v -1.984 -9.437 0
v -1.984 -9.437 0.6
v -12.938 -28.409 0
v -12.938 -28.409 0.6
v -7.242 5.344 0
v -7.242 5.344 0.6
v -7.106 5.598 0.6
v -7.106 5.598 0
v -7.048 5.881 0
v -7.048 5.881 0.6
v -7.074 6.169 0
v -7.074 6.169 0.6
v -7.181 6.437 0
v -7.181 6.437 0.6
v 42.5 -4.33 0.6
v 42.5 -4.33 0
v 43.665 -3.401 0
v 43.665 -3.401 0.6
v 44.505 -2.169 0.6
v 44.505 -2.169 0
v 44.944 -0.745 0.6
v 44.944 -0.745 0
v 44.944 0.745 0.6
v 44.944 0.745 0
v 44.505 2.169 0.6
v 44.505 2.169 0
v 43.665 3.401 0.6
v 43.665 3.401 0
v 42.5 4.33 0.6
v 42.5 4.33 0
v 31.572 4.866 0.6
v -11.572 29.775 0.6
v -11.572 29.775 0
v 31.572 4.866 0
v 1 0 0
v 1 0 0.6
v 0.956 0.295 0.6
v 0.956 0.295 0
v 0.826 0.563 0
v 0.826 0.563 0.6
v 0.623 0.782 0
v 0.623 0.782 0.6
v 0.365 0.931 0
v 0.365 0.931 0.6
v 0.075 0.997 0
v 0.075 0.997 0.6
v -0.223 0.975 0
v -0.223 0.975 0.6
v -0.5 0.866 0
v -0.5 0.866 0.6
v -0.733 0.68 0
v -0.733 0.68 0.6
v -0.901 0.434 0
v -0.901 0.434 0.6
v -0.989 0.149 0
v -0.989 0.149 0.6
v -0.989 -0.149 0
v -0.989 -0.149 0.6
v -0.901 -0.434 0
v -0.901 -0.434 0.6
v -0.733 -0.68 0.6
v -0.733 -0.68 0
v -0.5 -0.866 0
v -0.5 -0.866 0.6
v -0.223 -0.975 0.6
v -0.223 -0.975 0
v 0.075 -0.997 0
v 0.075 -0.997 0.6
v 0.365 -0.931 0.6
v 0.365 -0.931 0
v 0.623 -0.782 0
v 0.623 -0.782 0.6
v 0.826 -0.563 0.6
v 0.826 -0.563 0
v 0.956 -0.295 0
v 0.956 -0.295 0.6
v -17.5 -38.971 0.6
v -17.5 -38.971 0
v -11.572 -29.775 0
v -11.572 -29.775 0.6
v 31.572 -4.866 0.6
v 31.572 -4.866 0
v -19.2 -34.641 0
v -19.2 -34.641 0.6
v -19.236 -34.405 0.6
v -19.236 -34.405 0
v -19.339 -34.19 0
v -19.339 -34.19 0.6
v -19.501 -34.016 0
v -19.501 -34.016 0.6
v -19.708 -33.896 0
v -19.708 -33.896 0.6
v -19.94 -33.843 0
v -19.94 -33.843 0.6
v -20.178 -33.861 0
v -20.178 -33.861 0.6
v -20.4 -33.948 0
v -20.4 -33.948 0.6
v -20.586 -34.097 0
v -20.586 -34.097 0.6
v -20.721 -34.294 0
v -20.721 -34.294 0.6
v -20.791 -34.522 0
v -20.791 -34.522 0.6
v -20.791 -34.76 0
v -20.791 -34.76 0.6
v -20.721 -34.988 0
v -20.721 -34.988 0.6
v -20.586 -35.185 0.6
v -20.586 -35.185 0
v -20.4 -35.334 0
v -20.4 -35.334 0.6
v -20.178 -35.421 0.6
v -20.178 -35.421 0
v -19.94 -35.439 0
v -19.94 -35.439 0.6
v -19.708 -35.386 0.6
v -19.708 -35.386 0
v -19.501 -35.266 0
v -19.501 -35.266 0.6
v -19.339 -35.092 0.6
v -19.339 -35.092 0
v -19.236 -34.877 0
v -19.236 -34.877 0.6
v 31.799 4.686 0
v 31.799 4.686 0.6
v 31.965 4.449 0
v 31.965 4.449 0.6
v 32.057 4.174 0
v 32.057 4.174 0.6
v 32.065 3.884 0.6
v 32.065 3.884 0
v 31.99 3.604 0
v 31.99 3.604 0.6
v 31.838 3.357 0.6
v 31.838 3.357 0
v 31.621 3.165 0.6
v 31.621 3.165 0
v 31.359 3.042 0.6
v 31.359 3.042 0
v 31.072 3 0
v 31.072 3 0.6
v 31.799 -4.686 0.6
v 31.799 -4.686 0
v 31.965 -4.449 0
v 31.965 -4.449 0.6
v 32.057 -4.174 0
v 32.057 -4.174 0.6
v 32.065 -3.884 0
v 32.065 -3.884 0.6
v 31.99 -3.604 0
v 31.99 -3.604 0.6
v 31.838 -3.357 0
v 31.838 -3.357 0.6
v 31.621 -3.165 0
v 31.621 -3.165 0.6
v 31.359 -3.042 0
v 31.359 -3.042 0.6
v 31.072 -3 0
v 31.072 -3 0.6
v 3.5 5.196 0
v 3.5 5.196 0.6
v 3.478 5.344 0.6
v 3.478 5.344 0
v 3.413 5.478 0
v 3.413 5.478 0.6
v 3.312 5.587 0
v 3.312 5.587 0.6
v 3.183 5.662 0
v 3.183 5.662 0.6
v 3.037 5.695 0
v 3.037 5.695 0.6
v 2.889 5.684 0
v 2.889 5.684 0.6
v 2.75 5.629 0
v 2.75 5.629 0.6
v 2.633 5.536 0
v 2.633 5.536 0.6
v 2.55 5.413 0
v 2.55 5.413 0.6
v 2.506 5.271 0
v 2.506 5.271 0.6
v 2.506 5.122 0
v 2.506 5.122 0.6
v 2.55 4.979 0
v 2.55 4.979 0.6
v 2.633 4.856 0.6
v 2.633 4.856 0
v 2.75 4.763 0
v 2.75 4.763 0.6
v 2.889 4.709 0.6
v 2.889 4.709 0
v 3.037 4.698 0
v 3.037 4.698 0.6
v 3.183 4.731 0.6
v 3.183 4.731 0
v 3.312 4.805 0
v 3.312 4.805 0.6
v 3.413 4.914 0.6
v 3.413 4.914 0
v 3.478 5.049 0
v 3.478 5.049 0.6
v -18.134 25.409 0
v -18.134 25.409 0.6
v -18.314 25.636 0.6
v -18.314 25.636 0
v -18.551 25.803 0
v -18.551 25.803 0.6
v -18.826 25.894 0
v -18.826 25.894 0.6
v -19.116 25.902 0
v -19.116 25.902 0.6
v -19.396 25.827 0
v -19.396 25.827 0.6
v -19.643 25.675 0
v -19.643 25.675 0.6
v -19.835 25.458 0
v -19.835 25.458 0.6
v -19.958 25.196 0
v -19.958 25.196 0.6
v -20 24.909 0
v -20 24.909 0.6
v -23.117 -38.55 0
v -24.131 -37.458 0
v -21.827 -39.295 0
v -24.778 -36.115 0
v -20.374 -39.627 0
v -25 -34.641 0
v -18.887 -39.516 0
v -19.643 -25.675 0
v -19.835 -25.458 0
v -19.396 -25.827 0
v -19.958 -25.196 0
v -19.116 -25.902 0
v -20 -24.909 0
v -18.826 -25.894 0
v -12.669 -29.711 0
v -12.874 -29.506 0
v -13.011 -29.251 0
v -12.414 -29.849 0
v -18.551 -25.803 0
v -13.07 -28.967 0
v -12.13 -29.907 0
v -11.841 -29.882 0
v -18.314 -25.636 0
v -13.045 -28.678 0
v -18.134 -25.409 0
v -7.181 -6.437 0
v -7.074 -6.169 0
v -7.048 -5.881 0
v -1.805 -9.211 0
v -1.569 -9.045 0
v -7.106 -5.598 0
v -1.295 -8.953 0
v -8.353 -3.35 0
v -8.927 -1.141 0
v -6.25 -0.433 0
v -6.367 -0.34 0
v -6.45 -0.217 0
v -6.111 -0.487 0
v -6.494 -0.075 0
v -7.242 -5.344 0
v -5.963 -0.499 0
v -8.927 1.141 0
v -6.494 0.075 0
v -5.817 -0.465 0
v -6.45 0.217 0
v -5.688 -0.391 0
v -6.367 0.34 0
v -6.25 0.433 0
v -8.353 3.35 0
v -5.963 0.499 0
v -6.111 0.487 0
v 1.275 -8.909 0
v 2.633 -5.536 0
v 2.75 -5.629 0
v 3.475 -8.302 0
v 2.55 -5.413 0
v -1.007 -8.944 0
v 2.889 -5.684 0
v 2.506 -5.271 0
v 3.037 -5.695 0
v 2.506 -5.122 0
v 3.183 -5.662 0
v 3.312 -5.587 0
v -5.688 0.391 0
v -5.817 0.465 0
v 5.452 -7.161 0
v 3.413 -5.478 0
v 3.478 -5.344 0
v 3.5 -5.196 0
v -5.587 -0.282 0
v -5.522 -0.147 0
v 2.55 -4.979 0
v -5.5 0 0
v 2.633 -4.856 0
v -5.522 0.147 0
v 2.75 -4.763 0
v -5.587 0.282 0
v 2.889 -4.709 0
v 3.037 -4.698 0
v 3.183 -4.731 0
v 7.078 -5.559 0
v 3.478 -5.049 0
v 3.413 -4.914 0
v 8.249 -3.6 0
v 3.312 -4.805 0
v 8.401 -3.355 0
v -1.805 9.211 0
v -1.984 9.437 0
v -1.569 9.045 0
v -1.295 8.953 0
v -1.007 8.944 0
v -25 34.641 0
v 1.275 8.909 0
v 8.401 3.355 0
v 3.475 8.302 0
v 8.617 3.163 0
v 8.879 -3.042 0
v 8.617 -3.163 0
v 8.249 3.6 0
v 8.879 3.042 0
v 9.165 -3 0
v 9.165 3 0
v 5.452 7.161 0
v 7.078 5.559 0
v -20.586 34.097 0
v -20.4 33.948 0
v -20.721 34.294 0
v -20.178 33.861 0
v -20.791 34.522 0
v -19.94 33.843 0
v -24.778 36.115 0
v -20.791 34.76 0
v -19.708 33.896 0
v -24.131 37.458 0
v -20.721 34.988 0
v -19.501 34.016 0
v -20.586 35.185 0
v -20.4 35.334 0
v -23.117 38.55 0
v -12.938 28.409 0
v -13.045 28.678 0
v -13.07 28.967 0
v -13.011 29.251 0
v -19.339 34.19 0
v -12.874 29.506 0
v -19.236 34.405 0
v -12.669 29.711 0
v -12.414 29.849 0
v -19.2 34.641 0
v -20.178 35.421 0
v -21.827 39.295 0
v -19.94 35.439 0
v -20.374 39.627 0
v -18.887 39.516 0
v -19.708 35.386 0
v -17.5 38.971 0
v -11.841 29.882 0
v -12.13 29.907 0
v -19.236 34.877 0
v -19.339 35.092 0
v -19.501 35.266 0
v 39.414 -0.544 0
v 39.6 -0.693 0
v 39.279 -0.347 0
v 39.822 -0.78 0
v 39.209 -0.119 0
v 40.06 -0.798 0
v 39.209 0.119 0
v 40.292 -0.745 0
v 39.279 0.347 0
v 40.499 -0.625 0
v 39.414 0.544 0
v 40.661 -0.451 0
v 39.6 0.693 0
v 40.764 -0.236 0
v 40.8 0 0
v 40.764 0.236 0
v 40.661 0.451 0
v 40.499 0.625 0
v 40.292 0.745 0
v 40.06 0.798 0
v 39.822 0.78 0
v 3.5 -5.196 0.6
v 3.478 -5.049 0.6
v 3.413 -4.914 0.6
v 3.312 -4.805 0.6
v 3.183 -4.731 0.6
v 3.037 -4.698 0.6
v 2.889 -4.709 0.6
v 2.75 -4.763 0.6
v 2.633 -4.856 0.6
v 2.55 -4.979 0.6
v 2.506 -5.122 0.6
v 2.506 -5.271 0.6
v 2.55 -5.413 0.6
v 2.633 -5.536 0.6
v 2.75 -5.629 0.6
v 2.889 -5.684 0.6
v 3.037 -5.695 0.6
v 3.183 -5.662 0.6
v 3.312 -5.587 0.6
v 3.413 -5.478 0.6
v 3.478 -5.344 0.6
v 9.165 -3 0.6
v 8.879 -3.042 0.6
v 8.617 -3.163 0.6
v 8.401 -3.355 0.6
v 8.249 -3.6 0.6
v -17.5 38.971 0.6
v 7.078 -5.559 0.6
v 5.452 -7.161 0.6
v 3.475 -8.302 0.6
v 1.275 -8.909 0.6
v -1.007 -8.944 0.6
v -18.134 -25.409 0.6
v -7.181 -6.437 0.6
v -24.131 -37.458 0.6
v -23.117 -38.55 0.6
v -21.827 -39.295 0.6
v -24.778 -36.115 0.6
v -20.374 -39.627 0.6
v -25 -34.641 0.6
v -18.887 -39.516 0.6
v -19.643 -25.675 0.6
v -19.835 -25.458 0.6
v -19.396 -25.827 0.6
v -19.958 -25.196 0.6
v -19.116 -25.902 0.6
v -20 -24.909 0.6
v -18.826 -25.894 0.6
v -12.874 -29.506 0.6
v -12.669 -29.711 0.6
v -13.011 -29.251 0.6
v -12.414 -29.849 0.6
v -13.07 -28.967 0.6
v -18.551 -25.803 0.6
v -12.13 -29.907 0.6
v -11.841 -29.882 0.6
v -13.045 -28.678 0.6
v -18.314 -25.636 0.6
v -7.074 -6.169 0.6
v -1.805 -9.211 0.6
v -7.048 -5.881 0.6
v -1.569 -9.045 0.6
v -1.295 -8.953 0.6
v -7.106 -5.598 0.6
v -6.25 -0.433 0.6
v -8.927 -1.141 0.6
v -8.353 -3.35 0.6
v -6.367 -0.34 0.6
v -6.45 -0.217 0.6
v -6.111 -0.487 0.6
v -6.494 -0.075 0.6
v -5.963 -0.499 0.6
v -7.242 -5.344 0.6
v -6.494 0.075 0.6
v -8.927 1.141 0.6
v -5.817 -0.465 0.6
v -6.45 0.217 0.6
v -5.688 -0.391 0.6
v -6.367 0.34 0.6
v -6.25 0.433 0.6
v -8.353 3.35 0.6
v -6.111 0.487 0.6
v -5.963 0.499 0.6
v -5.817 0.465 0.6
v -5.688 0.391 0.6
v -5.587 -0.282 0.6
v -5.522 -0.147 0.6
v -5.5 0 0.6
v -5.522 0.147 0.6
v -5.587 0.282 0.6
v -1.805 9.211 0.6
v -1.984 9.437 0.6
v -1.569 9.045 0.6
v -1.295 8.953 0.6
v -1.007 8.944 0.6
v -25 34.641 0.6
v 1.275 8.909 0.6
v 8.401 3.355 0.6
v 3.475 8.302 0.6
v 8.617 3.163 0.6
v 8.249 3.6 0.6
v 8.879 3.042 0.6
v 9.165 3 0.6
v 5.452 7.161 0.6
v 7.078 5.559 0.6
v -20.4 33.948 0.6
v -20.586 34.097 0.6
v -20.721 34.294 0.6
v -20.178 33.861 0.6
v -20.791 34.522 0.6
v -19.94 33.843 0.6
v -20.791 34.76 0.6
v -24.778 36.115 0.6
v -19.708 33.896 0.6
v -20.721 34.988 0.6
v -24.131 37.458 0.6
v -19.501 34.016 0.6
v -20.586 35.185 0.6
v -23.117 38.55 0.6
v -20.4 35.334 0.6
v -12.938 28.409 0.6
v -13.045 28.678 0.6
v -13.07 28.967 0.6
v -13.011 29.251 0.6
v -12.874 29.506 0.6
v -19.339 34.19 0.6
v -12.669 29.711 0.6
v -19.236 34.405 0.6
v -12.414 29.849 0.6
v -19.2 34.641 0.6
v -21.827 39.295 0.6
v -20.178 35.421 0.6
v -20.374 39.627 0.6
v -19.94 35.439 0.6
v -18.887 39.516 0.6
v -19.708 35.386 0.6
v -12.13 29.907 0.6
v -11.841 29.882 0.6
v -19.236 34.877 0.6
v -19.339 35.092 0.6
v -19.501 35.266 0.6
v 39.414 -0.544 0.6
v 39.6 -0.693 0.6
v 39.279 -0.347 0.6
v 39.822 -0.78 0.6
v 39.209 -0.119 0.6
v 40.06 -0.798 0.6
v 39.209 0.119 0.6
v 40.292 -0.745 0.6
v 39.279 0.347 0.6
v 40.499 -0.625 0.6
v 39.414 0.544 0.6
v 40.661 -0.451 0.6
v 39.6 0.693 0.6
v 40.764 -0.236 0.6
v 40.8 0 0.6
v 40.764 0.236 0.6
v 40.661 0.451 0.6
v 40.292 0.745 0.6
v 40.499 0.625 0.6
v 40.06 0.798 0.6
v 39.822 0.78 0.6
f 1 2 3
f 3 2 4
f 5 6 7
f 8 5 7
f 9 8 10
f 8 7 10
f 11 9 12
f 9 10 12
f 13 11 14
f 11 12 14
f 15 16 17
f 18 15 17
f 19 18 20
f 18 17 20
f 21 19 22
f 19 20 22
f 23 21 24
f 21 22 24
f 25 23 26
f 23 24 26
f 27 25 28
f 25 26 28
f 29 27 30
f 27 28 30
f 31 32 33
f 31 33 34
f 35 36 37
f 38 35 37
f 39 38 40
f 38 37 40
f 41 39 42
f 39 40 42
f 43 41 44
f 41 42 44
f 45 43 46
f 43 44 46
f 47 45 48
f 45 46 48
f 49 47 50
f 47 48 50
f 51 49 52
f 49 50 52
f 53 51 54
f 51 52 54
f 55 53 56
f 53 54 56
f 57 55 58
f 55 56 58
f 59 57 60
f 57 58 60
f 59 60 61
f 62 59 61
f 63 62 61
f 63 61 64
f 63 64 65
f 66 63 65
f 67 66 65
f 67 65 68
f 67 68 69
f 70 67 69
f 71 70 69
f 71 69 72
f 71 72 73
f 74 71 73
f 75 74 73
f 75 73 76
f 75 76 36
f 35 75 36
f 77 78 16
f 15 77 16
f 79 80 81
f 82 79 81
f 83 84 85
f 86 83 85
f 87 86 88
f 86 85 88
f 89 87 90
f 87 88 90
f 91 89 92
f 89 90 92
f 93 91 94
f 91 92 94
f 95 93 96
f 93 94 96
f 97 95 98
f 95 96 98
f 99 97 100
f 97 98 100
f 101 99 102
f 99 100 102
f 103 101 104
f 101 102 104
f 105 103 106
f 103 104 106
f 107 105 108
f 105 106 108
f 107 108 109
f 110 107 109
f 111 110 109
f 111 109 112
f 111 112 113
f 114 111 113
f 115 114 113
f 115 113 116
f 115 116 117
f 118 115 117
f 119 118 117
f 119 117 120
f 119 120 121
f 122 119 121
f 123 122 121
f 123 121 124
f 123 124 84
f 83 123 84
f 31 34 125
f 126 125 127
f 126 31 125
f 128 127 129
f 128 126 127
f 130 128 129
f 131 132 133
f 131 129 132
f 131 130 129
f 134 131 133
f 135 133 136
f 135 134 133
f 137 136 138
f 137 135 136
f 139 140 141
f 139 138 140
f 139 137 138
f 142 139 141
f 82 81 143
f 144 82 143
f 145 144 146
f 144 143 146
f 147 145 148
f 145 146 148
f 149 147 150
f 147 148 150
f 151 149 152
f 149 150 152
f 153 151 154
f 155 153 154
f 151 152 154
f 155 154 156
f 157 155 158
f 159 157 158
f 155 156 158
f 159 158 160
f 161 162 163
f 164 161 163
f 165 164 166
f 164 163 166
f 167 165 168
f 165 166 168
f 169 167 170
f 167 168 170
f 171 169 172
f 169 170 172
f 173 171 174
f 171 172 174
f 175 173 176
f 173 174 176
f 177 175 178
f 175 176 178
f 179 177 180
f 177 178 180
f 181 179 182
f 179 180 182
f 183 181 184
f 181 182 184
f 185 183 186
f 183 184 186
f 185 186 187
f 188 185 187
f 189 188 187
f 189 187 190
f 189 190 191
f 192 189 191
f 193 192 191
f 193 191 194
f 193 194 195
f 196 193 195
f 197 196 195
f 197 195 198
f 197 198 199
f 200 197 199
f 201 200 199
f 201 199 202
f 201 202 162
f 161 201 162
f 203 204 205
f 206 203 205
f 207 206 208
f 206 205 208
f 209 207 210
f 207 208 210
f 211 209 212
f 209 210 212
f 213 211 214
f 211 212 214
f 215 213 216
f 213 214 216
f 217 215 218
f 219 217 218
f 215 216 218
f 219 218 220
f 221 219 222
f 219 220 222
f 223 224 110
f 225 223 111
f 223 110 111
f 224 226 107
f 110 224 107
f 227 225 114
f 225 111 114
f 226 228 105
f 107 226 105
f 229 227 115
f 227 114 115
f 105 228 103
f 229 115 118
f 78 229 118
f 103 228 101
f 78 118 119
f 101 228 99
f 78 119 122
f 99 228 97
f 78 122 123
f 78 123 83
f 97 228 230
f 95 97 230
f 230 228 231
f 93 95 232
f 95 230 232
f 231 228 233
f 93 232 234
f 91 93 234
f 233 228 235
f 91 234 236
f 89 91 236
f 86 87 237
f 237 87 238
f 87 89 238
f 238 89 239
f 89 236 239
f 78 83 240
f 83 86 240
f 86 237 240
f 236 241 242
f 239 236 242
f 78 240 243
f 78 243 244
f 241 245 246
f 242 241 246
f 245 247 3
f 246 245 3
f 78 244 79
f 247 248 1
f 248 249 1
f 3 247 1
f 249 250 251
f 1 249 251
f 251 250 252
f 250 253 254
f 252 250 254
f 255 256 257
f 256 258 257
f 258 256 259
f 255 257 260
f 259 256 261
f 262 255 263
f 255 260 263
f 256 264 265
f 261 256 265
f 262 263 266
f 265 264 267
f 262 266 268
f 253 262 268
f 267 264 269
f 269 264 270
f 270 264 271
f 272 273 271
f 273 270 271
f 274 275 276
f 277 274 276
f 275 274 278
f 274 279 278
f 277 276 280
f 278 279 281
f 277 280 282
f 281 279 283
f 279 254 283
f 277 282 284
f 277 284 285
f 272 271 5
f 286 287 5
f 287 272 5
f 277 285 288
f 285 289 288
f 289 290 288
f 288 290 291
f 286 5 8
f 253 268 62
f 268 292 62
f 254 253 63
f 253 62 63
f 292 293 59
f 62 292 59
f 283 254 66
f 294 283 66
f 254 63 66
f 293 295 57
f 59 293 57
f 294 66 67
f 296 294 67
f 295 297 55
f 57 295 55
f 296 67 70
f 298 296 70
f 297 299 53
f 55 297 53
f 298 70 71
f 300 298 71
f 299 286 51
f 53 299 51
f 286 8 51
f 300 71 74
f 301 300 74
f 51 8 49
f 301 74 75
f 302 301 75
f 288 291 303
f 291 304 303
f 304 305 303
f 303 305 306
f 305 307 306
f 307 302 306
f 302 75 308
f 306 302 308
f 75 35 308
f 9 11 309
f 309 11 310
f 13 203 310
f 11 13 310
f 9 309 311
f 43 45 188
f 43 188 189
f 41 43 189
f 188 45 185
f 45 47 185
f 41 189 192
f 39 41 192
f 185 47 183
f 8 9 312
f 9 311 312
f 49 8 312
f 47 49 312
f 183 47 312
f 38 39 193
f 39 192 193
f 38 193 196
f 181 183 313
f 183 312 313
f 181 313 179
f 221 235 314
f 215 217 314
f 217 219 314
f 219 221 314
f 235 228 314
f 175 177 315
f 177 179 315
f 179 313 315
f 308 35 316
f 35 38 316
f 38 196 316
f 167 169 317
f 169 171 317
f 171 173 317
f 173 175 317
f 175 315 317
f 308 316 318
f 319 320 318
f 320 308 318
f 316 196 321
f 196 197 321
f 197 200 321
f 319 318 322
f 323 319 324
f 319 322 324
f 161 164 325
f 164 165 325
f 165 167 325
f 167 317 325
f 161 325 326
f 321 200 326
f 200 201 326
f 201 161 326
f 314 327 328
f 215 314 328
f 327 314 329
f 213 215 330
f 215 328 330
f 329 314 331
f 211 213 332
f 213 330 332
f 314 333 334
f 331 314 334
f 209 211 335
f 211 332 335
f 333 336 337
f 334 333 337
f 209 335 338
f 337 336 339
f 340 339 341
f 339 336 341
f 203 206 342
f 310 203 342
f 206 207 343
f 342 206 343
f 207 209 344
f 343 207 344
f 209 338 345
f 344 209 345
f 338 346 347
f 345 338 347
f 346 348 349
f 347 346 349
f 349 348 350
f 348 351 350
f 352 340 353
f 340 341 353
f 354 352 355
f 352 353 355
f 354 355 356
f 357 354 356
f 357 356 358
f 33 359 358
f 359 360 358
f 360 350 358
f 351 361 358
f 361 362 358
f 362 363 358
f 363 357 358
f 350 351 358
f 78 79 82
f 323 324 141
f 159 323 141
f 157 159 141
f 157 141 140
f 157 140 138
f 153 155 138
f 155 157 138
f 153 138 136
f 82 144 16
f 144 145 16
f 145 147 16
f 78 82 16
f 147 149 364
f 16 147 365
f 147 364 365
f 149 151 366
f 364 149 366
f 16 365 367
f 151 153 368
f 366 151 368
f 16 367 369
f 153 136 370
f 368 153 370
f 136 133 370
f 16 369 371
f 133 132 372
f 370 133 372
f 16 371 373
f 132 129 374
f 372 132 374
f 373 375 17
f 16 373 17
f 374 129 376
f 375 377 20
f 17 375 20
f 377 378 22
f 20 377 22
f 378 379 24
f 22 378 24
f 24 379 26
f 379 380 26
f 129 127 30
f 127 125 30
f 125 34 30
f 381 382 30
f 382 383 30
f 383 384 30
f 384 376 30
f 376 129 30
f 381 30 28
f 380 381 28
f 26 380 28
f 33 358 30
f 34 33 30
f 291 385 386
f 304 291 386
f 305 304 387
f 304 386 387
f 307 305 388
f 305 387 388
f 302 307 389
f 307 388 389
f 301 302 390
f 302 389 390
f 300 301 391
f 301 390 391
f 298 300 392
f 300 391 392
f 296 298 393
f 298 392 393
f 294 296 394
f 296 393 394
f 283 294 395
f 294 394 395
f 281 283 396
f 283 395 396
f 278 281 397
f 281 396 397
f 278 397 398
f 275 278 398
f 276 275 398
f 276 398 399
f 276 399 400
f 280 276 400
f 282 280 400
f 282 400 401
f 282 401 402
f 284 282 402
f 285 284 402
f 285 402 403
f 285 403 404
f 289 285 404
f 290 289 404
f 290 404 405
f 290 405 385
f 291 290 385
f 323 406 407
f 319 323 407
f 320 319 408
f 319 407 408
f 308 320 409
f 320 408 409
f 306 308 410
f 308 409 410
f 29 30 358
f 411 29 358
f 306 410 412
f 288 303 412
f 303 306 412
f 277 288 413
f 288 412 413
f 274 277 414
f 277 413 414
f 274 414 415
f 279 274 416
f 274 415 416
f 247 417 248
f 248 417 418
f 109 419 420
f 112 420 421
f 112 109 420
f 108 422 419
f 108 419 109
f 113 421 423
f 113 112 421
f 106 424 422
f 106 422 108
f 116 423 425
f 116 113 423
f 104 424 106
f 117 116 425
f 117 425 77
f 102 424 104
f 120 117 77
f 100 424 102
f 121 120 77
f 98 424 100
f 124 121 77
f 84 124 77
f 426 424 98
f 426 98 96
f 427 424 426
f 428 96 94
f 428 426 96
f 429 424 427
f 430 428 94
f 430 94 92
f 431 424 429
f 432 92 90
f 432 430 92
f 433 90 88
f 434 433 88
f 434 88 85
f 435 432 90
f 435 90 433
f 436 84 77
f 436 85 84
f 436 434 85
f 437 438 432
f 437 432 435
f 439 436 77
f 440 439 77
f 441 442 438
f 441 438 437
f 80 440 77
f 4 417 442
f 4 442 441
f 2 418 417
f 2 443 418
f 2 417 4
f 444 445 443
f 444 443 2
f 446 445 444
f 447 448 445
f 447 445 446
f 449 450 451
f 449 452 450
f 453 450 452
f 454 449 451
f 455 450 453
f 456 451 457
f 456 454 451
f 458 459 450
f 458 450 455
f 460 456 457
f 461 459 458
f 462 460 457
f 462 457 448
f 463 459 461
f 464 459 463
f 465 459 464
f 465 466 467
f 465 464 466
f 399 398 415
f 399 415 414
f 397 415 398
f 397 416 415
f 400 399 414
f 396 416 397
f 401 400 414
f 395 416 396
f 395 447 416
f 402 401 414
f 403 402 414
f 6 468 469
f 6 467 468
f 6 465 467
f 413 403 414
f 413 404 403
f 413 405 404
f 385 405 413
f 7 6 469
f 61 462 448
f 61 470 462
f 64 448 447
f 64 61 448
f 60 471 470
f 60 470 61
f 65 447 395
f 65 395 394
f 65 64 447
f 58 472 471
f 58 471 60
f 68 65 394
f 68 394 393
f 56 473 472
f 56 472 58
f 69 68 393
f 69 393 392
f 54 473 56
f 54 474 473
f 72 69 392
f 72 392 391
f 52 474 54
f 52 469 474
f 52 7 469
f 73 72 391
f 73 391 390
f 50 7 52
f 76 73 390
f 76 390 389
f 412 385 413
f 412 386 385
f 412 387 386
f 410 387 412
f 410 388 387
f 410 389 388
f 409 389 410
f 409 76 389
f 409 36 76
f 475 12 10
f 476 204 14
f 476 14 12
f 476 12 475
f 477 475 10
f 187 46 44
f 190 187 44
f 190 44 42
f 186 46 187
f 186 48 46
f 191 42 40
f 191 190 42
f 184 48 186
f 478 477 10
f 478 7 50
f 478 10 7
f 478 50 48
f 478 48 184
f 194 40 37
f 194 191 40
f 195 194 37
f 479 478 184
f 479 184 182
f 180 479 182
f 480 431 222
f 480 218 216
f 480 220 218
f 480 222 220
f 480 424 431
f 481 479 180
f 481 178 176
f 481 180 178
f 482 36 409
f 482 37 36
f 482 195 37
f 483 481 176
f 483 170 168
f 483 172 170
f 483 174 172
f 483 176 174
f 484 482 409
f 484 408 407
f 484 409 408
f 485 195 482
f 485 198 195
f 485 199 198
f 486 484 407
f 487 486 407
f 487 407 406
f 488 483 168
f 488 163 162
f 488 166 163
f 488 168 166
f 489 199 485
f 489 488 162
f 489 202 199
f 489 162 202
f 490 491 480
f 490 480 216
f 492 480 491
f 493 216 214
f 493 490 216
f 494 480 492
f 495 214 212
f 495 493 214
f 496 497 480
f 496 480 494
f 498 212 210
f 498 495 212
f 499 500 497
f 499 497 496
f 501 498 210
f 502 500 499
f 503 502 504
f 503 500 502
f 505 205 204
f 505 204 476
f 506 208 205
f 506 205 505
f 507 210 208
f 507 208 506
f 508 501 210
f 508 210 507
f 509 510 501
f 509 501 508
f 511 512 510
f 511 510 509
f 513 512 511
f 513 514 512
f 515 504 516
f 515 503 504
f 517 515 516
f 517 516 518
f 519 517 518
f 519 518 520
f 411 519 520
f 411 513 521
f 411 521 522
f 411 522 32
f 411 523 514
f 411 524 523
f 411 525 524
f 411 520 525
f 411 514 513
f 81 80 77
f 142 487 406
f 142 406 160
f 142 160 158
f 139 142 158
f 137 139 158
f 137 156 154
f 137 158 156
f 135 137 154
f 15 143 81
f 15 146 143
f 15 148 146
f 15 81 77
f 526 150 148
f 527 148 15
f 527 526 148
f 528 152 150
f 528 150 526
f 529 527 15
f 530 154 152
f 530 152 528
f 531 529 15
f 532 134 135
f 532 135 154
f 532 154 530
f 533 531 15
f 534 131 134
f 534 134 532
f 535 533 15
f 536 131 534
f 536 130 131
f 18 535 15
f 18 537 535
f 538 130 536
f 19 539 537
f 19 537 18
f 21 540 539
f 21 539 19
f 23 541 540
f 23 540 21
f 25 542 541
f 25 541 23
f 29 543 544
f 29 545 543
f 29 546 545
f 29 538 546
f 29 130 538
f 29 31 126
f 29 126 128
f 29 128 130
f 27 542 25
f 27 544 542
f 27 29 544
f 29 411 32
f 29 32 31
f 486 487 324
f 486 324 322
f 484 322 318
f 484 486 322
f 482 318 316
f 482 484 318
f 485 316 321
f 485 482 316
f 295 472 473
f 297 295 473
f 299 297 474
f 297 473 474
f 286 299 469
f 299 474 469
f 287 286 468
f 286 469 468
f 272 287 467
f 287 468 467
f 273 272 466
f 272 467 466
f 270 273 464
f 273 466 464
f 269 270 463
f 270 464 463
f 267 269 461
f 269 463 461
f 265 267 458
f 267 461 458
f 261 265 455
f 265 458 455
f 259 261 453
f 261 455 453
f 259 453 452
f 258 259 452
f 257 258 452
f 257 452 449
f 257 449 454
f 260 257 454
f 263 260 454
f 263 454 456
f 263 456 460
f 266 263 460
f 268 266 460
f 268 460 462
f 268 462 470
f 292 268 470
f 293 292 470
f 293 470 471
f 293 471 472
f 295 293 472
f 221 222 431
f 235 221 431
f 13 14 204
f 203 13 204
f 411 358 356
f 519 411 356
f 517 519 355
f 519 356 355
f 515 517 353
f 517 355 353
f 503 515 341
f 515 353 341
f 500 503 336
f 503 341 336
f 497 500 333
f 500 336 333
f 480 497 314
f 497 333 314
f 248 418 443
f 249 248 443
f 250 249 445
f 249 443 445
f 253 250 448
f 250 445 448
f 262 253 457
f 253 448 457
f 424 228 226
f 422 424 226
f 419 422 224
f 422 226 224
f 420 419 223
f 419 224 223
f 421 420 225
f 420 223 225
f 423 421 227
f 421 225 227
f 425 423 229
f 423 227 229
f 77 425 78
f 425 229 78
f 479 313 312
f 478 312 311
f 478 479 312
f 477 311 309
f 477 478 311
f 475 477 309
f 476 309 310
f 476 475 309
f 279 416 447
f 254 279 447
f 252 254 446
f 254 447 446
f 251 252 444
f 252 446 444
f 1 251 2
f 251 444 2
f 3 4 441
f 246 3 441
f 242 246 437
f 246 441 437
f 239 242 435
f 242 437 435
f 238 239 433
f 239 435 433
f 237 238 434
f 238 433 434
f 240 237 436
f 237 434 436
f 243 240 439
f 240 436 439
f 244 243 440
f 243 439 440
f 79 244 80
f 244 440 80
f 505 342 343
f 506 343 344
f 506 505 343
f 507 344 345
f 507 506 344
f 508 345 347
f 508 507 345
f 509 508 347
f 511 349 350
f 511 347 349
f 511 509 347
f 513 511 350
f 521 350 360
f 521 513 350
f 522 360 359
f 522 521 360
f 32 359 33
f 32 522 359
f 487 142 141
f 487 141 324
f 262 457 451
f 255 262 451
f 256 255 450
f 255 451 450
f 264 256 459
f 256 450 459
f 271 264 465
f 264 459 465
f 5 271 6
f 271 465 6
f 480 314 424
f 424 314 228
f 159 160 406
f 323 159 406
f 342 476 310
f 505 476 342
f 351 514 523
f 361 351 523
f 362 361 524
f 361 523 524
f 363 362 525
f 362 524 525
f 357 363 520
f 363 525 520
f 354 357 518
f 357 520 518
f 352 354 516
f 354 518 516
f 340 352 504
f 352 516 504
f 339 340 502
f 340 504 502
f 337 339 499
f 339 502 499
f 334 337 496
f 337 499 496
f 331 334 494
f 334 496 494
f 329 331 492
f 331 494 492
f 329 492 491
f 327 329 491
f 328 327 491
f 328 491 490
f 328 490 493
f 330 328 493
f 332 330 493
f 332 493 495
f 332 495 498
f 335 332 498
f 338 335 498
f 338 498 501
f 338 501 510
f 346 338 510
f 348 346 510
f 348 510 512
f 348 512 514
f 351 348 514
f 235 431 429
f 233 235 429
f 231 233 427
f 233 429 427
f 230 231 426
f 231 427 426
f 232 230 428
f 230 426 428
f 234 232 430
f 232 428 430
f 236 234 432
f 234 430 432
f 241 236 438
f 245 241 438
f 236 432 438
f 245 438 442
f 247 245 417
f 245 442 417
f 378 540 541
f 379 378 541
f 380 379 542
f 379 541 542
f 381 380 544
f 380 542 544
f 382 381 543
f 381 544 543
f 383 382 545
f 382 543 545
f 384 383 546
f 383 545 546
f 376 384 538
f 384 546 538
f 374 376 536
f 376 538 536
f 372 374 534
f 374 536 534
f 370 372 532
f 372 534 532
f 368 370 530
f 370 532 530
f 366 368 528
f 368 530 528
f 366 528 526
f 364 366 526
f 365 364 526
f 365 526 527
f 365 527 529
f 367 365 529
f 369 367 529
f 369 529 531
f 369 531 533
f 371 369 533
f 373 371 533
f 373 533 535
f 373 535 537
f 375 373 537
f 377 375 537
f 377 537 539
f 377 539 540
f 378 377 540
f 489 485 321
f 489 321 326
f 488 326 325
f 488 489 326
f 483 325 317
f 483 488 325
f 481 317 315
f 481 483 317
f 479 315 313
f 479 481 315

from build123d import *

# Parameters (mm, degrees)
BOARD_DEPTH  = 0.6
CUT_DEPTH    = 60.97307864
HOLESSKE_R   = 0.5
HOLESSKE_R_2 = 1
HOLES_DEPTH  = 60.97307864
HOLES2SKE_R  = 0.8
HOLES2_DEPTH = 60.97307864


with BuildPart() as part:
    # BoardSke → Board (new body)
    with BuildSketch(Plane.XY):
        with BuildLine():
            Line((42.5, 4.330127019), (-17.5, 38.97114317))
            ThreePointArc((-17.5, 38.97114317), (-22.5, 38.97114317), (-25, 34.641016151))
            Line((-25, 34.641016151), (-25, -34.641016151))
            ThreePointArc((-25, -34.641016151), (-22.5, -38.97114317), (-17.5, -38.97114317))
            Line((-17.5, -38.97114317), (42.5, -4.330127019))
            ThreePointArc((42.5, -4.330127019), (45, 0), (42.5, 4.330127019))
        make_face()
    extrude(amount=BOARD_DEPTH)

    # CutSke → Cut (cut, through all)
    with BuildSketch(Plane.XY.offset(0.6)):
        with BuildLine():
            Line((31.07179677, 3), (9.16515139, 3))
            ThreePointArc((9.16515139, 3), (8.617428832, 3.163339973), (8.248636251, 3.6))
            ThreePointArc((8.248636251, 3.6), (4.5, 7.794228634), (-1.006626672, 8.94352854))
            ThreePointArc((-1.006626672, 8.94352854), (-1.569181638, 9.044582271), (-1.984499484, 9.437253933))
            Line((-1.984499484, 9.437253933), (-12.937822174, 28.408965344))
            ThreePointArc((-12.937822174, 28.408965344), (-12.778903551, 29.616072125), (-11.57179677, 29.774990748))
            Line((-11.57179677, 29.774990748), (31.57179677, 4.866025404))
            ThreePointArc((31.57179677, 4.866025404), (32.037722596, 3.741180955), (31.07179677, 3))
        make_face()
        with BuildLine():
            Line((31.07179677, -3), (9.16515139, -3))
            ThreePointArc((9.16515139, -3), (8.617428832, -3.163339973), (8.248636251, -3.6))
            ThreePointArc((8.248636251, -3.6), (4.5, -7.794228634), (-1.006626672, -8.94352854))
            ThreePointArc((-1.006626672, -8.94352854), (-1.569181638, -9.044582271), (-1.984499484, -9.437253933))
            Line((-1.984499484, -9.437253933), (-12.937822174, -28.408965344))
            ThreePointArc((-12.937822174, -28.408965344), (-12.778903551, -29.616072125), (-11.57179677, -29.774990748))
            Line((-11.57179677, -29.774990748), (31.57179677, -4.866025404))
            ThreePointArc((31.57179677, -4.866025404), (32.037722596, -3.741180955), (31.07179677, -3))
        make_face()
        with BuildLine():
            Line((-18.133974596, -25.408965344), (-7.180651906, -6.437253933))
            ThreePointArc((-7.180651906, -6.437253933), (-7.048247194, -5.881242297), (-7.242009579, -5.34352854))
            ThreePointArc((-7.242009579, -5.34352854), (-9, 0), (-7.242009579, 5.34352854))
            ThreePointArc((-7.242009579, 5.34352854), (-7.048247194, 5.881242297), (-7.180651906, 6.437253933))
            Line((-7.180651906, 6.437253933), (-18.133974596, 25.408965344))
            ThreePointArc((-18.133974596, 25.408965344), (-19.258819045, 25.87489117), (-20, 24.908965344))
            Line((-20, 24.908965344), (-20, -24.908965344))
            ThreePointArc((-20, -24.908965344), (-19.258819045, -25.87489117), (-18.133974596, -25.408965344))
        make_face()
    extrude(amount=-CUT_DEPTH, mode=Mode.SUBTRACT)

    # HolesSke → Holes (cut, through all)
    with BuildSketch(Plane.XY.offset(0.6)):
        with Locations((-6, 0)):
            Circle(HOLESSKE_R)
        with Locations((3, 5.196152423)):
            Circle(HOLESSKE_R)
        with Locations((3, -5.196152423)):
            Circle(HOLESSKE_R)
        Circle(HOLESSKE_R_2)
    extrude(amount=-HOLES_DEPTH, mode=Mode.SUBTRACT)

    # Holes2Ske → Holes2 (cut, through all)
    with BuildSketch(Plane.XY.offset(0.6)):
        with Locations((40, 0)):
            Circle(HOLES2SKE_R)
        with Locations((-20, -34.641016151)):
            Circle(HOLES2SKE_R)
        with Locations((-20, 34.641016151)):
            Circle(HOLES2SKE_R)
    extrude(amount=-HOLES2_DEPTH, mode=Mode.SUBTRACT)


solid = part.part
